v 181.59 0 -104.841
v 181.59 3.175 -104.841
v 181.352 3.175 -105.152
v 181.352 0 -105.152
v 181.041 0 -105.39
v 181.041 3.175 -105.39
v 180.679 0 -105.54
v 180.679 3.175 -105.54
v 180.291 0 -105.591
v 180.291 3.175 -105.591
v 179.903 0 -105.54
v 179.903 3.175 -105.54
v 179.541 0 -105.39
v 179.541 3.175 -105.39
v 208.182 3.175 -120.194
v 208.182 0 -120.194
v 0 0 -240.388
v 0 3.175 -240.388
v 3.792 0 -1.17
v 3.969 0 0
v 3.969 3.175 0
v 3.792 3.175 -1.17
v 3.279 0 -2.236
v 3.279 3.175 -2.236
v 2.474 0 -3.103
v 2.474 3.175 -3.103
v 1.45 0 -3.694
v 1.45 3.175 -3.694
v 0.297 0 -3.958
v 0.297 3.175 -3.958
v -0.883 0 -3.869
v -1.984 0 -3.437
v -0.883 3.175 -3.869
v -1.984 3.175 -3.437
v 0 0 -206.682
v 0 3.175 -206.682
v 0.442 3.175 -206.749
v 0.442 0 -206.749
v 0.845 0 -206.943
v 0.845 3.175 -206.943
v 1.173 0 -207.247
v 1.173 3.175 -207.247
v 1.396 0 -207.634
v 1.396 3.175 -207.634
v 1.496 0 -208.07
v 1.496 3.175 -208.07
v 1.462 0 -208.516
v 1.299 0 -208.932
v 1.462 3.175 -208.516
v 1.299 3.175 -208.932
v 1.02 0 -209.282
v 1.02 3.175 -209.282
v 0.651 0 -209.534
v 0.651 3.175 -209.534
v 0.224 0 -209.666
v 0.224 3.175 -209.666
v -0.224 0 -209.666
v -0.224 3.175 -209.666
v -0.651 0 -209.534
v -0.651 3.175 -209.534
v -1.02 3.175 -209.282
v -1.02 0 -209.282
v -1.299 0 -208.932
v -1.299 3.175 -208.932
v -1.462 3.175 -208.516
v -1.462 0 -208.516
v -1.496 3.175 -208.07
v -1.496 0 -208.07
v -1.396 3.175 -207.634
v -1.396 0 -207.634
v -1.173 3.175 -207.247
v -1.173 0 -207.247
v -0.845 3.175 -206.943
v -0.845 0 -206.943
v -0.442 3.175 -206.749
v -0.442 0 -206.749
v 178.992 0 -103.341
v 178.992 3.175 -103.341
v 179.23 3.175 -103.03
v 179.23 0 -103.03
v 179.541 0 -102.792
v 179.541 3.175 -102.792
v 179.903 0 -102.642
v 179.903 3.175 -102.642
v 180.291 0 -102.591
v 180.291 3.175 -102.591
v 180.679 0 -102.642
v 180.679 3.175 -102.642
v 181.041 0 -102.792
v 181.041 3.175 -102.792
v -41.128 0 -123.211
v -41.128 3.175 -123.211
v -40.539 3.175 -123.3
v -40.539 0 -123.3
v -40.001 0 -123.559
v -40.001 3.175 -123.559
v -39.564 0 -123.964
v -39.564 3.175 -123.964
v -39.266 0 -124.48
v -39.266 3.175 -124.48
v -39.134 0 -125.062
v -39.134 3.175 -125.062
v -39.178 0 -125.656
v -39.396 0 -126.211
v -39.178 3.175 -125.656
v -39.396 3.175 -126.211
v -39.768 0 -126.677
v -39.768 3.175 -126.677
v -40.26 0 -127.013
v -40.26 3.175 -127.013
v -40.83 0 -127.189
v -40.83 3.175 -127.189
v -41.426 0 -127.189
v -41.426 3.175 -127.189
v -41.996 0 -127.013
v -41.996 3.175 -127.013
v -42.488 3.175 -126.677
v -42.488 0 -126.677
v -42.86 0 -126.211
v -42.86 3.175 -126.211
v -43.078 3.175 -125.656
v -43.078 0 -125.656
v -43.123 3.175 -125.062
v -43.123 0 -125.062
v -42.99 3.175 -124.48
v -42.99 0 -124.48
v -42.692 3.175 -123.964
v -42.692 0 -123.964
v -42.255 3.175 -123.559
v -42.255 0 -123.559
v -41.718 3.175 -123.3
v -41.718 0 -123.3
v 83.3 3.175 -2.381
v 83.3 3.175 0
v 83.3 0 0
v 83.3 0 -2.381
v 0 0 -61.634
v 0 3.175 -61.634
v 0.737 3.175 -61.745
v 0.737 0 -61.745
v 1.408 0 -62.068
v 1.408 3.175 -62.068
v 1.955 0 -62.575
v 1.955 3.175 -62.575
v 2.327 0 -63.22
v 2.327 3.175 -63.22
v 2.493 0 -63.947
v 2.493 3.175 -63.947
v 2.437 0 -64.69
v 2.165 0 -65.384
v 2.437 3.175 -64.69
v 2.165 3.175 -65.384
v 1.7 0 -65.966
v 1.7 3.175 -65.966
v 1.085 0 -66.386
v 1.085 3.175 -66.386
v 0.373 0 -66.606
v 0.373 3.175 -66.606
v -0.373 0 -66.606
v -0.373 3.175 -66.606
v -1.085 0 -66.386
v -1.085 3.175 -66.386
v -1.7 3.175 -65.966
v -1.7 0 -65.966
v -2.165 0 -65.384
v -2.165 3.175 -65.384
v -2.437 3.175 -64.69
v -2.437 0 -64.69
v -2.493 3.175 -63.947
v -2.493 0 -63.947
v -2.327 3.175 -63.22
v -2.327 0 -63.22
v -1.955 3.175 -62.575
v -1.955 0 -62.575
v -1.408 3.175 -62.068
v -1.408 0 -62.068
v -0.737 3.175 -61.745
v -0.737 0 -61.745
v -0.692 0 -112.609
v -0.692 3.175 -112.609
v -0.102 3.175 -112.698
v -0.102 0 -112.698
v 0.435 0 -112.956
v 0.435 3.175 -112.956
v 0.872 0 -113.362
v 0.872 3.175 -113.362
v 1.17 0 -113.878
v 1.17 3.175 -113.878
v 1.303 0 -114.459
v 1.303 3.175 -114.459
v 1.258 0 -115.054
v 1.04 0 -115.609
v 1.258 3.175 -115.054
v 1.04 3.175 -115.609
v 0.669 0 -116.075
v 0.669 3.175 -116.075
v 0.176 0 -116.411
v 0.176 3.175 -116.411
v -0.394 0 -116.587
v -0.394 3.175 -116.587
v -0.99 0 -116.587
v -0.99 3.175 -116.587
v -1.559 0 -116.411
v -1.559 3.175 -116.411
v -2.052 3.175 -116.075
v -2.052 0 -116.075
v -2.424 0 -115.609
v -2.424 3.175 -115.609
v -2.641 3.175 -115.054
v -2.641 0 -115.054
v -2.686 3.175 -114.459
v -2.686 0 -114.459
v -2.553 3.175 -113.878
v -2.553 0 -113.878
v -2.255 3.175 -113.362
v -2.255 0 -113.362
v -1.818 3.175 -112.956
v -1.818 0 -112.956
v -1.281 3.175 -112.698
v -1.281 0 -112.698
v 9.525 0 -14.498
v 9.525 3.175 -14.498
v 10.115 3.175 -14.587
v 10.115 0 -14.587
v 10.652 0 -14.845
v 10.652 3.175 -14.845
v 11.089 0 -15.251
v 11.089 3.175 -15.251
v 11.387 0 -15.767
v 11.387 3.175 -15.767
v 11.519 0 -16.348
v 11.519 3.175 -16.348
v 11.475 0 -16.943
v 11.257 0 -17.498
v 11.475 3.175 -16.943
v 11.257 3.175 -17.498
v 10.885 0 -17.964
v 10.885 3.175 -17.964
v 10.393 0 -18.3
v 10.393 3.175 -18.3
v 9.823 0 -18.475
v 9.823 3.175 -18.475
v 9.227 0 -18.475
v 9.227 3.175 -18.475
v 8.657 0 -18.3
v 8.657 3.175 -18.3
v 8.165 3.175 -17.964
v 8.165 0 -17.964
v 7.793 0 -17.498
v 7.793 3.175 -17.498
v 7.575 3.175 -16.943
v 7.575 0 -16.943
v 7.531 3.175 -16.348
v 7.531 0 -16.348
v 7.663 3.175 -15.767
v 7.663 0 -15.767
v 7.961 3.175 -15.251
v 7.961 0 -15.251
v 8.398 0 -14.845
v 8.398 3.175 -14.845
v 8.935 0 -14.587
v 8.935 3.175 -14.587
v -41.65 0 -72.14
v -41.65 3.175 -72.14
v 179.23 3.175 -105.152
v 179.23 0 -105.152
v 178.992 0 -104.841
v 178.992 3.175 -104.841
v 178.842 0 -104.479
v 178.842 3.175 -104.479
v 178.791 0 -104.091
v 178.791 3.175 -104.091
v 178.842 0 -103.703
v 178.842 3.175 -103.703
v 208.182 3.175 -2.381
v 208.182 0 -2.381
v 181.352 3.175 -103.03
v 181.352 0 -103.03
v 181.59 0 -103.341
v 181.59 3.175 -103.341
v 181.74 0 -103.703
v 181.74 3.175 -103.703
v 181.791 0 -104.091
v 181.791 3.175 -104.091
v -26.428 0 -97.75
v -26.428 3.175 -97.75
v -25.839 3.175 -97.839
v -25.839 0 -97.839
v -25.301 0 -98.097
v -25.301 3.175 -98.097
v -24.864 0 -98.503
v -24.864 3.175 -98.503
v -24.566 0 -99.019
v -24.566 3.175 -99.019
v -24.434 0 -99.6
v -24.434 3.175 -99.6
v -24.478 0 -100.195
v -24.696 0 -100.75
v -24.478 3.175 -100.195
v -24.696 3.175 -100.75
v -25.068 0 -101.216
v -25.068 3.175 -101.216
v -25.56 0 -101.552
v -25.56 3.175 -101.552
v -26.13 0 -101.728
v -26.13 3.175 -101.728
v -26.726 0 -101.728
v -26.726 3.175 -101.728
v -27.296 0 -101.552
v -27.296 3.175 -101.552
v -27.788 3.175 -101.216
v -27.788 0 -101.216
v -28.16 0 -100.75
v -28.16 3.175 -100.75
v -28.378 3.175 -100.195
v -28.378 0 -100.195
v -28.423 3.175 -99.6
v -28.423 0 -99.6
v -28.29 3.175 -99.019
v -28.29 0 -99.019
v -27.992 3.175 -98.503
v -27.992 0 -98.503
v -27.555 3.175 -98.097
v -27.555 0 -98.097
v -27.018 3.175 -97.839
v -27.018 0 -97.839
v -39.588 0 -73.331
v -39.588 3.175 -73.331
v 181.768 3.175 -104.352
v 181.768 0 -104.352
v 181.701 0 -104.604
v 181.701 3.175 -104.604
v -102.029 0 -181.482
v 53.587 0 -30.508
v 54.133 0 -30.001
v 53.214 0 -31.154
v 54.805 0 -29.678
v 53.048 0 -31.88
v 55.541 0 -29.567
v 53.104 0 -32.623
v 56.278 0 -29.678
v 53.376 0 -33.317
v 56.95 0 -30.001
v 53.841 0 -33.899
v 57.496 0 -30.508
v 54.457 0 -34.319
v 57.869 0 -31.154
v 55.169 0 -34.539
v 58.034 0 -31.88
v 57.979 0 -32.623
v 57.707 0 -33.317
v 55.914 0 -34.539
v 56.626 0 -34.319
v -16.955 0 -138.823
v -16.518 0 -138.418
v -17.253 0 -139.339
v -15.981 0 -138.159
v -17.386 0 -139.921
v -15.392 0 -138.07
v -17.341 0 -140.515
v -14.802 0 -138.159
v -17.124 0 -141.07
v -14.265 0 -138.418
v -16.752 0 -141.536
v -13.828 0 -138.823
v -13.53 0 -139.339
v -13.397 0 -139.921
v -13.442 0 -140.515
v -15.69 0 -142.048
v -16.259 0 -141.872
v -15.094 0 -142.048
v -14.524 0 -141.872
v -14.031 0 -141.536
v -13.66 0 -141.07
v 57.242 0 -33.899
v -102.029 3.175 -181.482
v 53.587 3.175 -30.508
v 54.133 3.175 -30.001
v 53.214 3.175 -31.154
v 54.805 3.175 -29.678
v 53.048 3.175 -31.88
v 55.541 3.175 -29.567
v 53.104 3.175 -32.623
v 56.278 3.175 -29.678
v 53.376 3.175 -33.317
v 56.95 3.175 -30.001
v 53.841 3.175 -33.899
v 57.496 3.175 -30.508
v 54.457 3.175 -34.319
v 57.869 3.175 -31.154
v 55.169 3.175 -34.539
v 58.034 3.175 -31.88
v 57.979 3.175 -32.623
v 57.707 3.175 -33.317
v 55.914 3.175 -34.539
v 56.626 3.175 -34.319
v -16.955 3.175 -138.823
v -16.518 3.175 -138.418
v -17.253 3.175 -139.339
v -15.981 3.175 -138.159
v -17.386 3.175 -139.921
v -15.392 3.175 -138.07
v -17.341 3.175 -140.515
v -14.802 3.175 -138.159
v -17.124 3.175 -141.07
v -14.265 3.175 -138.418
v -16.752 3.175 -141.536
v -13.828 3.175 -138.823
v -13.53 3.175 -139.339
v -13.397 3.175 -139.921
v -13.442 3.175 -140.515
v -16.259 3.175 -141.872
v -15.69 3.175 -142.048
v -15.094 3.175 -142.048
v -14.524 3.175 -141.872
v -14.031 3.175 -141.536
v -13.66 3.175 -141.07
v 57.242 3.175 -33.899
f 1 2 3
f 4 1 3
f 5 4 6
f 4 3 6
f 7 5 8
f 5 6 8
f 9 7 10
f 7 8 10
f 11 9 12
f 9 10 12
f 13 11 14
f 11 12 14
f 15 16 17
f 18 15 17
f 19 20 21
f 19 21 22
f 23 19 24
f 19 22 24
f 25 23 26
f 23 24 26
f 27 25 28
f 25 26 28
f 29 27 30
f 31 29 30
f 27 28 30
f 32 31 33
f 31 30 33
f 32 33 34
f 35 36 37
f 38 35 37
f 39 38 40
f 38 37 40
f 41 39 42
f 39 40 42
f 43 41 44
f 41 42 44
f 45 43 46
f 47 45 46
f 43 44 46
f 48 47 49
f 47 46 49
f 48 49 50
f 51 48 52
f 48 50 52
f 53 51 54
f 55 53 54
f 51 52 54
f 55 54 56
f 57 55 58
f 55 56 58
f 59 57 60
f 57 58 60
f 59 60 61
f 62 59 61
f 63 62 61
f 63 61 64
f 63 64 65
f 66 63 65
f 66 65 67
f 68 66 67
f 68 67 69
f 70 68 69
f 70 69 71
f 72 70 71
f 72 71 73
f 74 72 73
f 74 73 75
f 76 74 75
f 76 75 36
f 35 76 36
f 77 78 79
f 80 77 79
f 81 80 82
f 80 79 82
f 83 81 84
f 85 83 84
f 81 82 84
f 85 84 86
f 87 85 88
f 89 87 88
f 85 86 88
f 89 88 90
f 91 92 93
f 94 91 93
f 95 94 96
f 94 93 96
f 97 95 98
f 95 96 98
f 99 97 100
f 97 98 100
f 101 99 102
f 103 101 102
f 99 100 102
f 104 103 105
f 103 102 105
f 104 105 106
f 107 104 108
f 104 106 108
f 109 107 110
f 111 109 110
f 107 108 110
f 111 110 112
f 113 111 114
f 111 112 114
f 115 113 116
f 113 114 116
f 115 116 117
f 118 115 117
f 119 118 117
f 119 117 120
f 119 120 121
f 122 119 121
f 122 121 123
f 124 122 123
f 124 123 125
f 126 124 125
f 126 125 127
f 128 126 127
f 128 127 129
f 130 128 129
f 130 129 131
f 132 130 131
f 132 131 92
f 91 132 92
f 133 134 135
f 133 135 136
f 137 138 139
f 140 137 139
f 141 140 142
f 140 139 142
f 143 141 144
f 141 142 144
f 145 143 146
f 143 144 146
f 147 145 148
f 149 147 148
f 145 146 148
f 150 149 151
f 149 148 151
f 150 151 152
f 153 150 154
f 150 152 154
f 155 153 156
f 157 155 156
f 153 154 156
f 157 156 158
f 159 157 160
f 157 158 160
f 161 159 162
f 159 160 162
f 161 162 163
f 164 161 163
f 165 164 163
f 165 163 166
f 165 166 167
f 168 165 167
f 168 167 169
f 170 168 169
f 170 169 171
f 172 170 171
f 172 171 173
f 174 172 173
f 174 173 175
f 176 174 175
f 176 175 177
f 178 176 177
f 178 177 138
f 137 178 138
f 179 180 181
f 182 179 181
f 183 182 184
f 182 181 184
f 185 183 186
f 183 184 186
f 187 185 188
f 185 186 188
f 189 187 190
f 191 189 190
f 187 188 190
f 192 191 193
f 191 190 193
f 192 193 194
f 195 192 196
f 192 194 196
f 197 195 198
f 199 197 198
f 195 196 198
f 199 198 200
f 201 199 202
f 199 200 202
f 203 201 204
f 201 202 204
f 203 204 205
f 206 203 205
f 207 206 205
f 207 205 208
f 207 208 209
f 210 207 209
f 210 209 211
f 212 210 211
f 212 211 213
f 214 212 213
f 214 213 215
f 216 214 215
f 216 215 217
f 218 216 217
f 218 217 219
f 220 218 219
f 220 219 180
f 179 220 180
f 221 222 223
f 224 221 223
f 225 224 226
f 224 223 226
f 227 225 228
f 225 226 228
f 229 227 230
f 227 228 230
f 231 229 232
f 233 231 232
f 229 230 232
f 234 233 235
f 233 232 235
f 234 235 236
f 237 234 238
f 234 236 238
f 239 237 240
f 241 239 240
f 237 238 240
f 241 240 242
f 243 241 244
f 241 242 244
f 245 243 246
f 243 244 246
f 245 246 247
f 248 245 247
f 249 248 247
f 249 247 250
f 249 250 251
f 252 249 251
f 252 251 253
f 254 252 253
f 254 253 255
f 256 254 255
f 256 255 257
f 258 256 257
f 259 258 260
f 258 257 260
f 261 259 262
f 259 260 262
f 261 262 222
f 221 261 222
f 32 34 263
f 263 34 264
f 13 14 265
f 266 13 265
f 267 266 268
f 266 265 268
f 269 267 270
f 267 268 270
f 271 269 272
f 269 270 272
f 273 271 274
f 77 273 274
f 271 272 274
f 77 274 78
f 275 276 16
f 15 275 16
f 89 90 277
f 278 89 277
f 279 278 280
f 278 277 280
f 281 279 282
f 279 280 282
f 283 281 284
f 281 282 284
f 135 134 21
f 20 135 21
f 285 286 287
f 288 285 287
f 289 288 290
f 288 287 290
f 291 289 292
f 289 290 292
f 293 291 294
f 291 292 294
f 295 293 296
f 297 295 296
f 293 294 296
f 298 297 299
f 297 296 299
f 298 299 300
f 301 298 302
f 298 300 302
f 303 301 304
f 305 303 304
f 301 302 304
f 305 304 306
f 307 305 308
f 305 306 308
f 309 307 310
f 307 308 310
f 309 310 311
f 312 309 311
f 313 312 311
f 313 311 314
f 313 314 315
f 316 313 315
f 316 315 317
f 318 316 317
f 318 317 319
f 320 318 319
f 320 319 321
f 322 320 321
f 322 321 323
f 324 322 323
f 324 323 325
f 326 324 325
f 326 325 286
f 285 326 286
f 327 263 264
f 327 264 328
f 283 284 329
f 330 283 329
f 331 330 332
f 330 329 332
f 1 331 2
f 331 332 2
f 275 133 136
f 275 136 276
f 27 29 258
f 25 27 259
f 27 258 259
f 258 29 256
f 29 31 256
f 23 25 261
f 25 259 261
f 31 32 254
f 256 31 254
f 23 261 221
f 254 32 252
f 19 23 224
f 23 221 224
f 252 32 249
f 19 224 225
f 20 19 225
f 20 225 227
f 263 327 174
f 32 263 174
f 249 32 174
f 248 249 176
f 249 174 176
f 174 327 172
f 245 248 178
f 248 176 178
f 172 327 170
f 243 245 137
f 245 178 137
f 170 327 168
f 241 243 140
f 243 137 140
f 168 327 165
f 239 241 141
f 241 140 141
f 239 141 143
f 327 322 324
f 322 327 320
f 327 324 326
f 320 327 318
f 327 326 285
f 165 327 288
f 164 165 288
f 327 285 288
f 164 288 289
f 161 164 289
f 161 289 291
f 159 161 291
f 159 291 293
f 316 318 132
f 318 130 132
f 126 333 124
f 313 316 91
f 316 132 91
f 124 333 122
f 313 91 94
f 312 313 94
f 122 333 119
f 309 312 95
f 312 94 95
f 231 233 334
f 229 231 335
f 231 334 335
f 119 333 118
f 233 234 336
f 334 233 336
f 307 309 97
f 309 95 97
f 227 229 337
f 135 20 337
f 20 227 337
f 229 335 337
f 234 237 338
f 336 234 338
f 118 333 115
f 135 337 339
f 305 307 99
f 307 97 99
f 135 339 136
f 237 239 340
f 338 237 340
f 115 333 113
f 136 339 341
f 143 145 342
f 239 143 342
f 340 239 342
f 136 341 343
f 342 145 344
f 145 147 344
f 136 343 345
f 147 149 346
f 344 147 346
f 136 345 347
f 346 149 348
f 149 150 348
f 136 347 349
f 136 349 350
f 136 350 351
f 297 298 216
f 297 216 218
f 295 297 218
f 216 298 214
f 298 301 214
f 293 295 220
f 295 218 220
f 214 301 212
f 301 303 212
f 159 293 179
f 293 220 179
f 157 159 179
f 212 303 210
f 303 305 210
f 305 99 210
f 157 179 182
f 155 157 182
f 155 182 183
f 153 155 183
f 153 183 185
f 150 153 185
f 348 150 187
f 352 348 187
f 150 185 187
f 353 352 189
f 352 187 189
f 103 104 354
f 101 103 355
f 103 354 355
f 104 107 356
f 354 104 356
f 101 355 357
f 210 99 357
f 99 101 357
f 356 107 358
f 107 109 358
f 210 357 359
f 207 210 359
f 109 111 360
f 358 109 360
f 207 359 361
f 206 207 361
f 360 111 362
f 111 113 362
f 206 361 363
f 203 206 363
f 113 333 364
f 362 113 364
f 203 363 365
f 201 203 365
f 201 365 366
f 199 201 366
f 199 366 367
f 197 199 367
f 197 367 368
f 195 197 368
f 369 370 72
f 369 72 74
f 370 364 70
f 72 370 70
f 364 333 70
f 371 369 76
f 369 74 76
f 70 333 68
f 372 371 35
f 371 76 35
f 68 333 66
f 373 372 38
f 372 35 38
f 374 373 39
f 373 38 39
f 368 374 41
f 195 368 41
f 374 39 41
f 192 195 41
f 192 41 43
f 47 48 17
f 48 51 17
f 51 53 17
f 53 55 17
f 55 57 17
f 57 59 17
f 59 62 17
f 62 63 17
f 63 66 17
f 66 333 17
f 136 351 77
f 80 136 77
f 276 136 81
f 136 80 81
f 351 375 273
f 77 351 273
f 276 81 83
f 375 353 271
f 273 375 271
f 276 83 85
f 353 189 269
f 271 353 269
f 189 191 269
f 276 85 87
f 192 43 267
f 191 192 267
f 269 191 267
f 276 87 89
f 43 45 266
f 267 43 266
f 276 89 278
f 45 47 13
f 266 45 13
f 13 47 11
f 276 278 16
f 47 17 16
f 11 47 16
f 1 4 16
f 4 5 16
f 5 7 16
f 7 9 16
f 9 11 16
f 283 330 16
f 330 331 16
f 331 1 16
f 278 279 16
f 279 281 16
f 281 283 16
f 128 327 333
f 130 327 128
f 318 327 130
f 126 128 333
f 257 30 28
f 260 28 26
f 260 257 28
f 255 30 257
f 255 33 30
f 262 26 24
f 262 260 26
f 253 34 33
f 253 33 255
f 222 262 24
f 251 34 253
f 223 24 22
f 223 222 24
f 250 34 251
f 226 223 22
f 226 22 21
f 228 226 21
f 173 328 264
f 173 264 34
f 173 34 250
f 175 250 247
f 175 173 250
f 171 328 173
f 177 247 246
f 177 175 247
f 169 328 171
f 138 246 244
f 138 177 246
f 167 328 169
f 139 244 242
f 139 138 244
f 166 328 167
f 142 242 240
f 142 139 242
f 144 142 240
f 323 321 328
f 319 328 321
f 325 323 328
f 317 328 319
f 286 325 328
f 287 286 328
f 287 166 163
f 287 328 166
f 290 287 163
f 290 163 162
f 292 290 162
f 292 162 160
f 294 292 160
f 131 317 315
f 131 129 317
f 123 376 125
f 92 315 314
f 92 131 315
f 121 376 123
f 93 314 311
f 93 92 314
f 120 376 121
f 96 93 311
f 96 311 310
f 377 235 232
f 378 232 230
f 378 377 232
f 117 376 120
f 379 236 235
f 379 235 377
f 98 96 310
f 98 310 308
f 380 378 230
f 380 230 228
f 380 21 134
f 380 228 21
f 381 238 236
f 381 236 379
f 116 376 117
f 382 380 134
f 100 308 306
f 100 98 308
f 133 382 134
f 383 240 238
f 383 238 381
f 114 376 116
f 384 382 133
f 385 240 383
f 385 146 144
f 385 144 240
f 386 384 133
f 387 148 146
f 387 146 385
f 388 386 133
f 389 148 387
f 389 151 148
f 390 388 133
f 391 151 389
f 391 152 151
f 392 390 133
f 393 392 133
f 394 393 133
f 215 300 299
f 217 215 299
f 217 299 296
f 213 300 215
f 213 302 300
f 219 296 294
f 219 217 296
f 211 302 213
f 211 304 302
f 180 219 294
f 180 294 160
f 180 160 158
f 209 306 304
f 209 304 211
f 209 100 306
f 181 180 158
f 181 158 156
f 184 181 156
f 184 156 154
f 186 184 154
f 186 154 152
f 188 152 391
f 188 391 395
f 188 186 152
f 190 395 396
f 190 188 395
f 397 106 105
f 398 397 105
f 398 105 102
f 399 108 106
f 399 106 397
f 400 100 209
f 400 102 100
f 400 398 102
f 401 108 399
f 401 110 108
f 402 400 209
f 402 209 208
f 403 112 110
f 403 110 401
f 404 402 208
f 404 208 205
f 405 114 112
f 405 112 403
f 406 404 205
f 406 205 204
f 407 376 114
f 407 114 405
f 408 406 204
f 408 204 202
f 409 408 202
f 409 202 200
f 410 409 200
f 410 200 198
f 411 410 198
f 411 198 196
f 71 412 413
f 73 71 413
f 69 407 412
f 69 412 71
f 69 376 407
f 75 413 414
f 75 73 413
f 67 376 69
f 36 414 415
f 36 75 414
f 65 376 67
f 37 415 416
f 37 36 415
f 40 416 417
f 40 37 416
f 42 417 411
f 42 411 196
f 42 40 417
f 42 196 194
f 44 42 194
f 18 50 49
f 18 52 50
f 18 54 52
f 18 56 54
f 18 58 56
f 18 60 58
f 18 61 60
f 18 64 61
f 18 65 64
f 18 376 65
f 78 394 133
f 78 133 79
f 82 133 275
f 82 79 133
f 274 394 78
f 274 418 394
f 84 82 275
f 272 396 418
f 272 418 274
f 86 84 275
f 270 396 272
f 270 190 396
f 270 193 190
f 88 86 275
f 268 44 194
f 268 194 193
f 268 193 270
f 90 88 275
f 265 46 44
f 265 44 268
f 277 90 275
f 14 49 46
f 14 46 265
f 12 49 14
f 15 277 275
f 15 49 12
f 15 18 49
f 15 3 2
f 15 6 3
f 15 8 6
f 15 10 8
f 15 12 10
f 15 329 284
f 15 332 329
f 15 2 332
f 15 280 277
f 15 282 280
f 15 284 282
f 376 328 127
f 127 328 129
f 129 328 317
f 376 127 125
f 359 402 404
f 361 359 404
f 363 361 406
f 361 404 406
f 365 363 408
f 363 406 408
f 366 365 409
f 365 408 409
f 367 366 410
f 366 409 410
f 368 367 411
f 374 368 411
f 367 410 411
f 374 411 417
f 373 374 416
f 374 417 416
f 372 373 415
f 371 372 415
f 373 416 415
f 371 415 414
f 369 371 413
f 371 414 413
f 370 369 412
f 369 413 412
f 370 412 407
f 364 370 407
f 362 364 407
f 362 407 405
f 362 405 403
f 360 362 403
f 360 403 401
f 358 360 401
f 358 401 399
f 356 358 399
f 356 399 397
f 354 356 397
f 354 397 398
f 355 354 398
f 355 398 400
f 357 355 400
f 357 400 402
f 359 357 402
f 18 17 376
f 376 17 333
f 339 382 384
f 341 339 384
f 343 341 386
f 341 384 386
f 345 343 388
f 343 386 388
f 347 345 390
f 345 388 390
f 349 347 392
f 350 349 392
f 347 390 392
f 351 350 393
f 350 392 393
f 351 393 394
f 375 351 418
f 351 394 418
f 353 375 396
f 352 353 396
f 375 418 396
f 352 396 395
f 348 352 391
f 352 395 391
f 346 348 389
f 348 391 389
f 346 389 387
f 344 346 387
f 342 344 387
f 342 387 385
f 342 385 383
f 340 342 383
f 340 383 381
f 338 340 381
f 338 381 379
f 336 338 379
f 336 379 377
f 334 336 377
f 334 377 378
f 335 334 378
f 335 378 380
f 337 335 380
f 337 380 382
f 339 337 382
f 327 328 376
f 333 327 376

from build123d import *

# Parameters (mm, degrees)
BOSS_EXTRUDE1_DEPTH = 3.175
SKETCH2_R           = 2
SKETCH2_W           = 124.882271537
SKETCH2_H           = 4.7625
CUT_EXTRUDE1_DEPTH  = 319.019522016
SKETCH3_R           = 3.96875
CUT_EXTRUDE3_DEPTH  = 319.019522016
SKETCH5_R           = 2
CUT_EXTRUDE4_DEPTH  = 3.175
SKETCH7_R           = 2.5
CUT_EXTRUDE6_DEPTH  = 319.019522016
SKETCH8_R           = 1.5
CUT_EXTRUDE7_DEPTH  = 319.019522016
CUT_EXTRUDE5_DEPTH  = 3.175


with BuildPart() as part:
    # Sketch1 → Boss-Extrude1 (new body)
    with BuildSketch(Plane(origin=(0, 0, 0), x_dir=(1, 0, 0), z_dir=(0, 1, 0))):
        Polygon((-208.182271537, -120.194090512), (0, -240.388181024), (208.182271537, -120.194090512), (208.182271537, 120.194090512), (0, 240.388181024), (-208.182271537, 120.194090512), align=None)
    extrude(amount=BOSS_EXTRUDE1_DEPTH)

    # Sketch2 → Cut-Extrude1 (cut, through all)
    with BuildSketch(Plane(origin=(0, 3.175, 0), x_dir=(1, 0, 0), z_dir=(0, 1, 0))):
        Polygon((-106.153358761, 179.100510768), (-43.712222993, 70.949291135), (-39.587777007, 73.330541135), (-102.028912776, 181.481760768), align=None)
        with Locations(Location((99.6, -56.7055, 0), (0, 0, 270))):
            Circle(SKETCH2_R)
        with Locations(Location((129, -56.7055, 0), (0, 0, 270))):
            Circle(SKETCH2_R)
        with Locations(Location((129, -26.9875, 0), (0, 0, 270))):
            Circle(SKETCH2_R)
        with Locations(Location((99.6, -26.9875, 0), (0, 0, 270))):
            Circle(SKETCH2_R)
        with Locations(Location((-98.908403534, -57.903380217, 0), (0, 0, 270))):
            Circle(SKETCH2_R)
        with Locations(Location((-87.871860585, -98.223527088, 0), (0, 0, 270))):
            Circle(SKETCH2_R)
        with Locations(Location((-113.608403534, -83.364527088, 0), (0, 0, 270))):
            Circle(SKETCH2_R)
        Polygon((-102.028912776, -181.481760768), (-39.587777007, -73.330541135), (-43.712222993, -70.949291135), (-106.153358761, -179.100510768), align=None)
        with Locations(Location((-73.171860585, -72.762380217, 0), (0, 0, 270))):
            Circle(SKETCH2_R)
        with Locations(Location((-41.128139415, 125.211027088, 0), (0, 0, 270))):
            Circle(SKETCH2_R)
        with Locations(Location((-26.428139415, 99.749880217, 0), (0, 0, 270))):
            Circle(SKETCH2_R)
        with Locations((145.741135769, 0)):
            Rectangle(SKETCH2_W, SKETCH2_H)
        with Locations(Location((-15.391596466, 140.070027088, 0), (0, 0, 270))):
            Circle(SKETCH2_R)
        with Locations(Location((-0.691596466, 114.608880217, 0), (0, 0, 270))):
            Circle(SKETCH2_R)
    extrude(amount=-CUT_EXTRUDE1_DEPTH, mode=Mode.SUBTRACT)

    # Sketch3 → Cut-Extrude3 (cut, through all)
    with BuildSketch(Plane(origin=(0, 3.175, 0), x_dir=(1, 0, 0), z_dir=(0, 1, 0))):
        with Locations(Location((0, 0, 0), (0, 0, 270))):
            Circle(SKETCH3_R)
    extrude(amount=-CUT_EXTRUDE3_DEPTH, mode=Mode.SUBTRACT)

    # Sketch5 → Cut-Extrude4 (cut)
    with BuildSketch(Plane(origin=(0, 3.175, 0), x_dir=(1, 0, 0), z_dir=(0, 1, 0))):
        with Locations(Location((9.525, 16.497783942, 0), (0, 0, 270))):
            Circle(SKETCH5_R)
        with Locations(Location((9.525, -16.497783942, 0), (0, 0, 270))):
            Circle(SKETCH5_R)
        with Locations(Location((-19.05, 0, 0), (0, 0, 270))):
            Circle(SKETCH5_R)
    extrude(amount=-CUT_EXTRUDE4_DEPTH, mode=Mode.SUBTRACT)

    # Sketch7 → Cut-Extrude6 (cut, through all)
    with BuildSketch(Plane(origin=(0, 3.175, 0), x_dir=(1, 0, 0), z_dir=(0, 1, 0))):
        with Locations(Location((0, 64.13373, 0), (0, 0, 270))):
            Circle(SKETCH7_R)
        with Locations(Location((55.541439419, 32.066865, 0), (0, 0, 270))):
            Circle(SKETCH7_R)
        with Locations(Location((55.541439419, -32.066865, 0), (0, 0, 270))):
            Circle(SKETCH7_R)
        with Locations(Location((0, -64.13373, 0), (0, 0, 270))):
            Circle(SKETCH7_R)
        with Locations(Location((-55.541439419, -32.066865, 0), (0, 0, 270))):
            Circle(SKETCH7_R)
        with Locations(Location((-55.541439419, 32.066865, 0), (0, 0, 270))):
            Circle(SKETCH7_R)
    extrude(amount=-CUT_EXTRUDE6_DEPTH, mode=Mode.SUBTRACT)

    # Sketch8 → Cut-Extrude7 (cut, through all)
    with BuildSketch(Plane(origin=(0, 3.175, 0), x_dir=(1, 0, 0), z_dir=(0, 1, 0))):
        with BuildLine():
            ThreePointArc((181.791135768, 104.091135768), (181.740024508, 104.479364336), (181.590173874, 104.841135768))
            Line((181.590173874, 104.841135768), (180.291135768, 104.091135768))
            Line((180.291135768, 104.091135768), (181.041135768, 102.792097663))
            ThreePointArc((181.041135768, 102.792097663), (181.590173874, 103.341135768), (181.791135768, 104.091135768))
        make_face()
        with BuildLine():
            Line((180.291135768, 104.091135768), (181.590173874, 104.841135768))
            ThreePointArc((181.590173874, 104.841135768), (180.679364336, 105.540024508), (179.541135768, 105.390173874))
            Line((179.541135768, 105.390173874), (180.291135768, 104.091135768))
        make_face()
        with BuildLine():
            ThreePointArc((178.992097663, 103.341135768), (179.902907201, 102.642247029), (181.041135768, 102.792097663))
            Line((181.041135768, 102.792097663), (180.291135768, 104.091135768))
            Line((180.291135768, 104.091135768), (178.992097663, 103.341135768))
        make_face()
        with BuildLine():
            Line((180.291135768, 104.091135768), (179.541135768, 105.390173874))
            ThreePointArc((179.541135768, 105.390173874), (178.842247029, 104.479364336), (178.992097663, 103.341135768))
            Line((178.992097663, 103.341135768), (180.291135768, 104.091135768))
        make_face()
        with Locations(Location((0, -208.182271537, 0), (0, 0, 270))):
            Circle(SKETCH8_R)
        with Locations(Location((180.291135768, -104.091135768, 0), (0, 0, 270))):
            Circle(SKETCH8_R)
        with Locations(Location((0, 208.182271537, 0), (0, 0, 270))):
            Circle(SKETCH8_R)
        with Locations(Location((-180.291135768, -104.091135768, 0), (0, 0, 270))):
            Circle(SKETCH8_R)
        with Locations(Location((-180.291135768, 104.091135768, 0), (0, 0, 270))):
            Circle(SKETCH8_R)
    extrude(amount=-CUT_EXTRUDE7_DEPTH, mode=Mode.SUBTRACT)

    # Sketch6 → Cut-Extrude5 (cut)
    with BuildSketch(Plane(origin=(0, 3.175, 0), x_dir=(1, 0, 0), z_dir=(0, 1, 0))):
        with BuildLine():
            Line((0, 0), (-127, 219.970452561))
            ThreePointArc((-127, 219.970452561), (-127, -219.970452561), (254, 0))
            Line((254, 0), (0, 0))
        make_face()
    extrude(amount=-CUT_EXTRUDE5_DEPTH, mode=Mode.SUBTRACT)


solid = part.part
